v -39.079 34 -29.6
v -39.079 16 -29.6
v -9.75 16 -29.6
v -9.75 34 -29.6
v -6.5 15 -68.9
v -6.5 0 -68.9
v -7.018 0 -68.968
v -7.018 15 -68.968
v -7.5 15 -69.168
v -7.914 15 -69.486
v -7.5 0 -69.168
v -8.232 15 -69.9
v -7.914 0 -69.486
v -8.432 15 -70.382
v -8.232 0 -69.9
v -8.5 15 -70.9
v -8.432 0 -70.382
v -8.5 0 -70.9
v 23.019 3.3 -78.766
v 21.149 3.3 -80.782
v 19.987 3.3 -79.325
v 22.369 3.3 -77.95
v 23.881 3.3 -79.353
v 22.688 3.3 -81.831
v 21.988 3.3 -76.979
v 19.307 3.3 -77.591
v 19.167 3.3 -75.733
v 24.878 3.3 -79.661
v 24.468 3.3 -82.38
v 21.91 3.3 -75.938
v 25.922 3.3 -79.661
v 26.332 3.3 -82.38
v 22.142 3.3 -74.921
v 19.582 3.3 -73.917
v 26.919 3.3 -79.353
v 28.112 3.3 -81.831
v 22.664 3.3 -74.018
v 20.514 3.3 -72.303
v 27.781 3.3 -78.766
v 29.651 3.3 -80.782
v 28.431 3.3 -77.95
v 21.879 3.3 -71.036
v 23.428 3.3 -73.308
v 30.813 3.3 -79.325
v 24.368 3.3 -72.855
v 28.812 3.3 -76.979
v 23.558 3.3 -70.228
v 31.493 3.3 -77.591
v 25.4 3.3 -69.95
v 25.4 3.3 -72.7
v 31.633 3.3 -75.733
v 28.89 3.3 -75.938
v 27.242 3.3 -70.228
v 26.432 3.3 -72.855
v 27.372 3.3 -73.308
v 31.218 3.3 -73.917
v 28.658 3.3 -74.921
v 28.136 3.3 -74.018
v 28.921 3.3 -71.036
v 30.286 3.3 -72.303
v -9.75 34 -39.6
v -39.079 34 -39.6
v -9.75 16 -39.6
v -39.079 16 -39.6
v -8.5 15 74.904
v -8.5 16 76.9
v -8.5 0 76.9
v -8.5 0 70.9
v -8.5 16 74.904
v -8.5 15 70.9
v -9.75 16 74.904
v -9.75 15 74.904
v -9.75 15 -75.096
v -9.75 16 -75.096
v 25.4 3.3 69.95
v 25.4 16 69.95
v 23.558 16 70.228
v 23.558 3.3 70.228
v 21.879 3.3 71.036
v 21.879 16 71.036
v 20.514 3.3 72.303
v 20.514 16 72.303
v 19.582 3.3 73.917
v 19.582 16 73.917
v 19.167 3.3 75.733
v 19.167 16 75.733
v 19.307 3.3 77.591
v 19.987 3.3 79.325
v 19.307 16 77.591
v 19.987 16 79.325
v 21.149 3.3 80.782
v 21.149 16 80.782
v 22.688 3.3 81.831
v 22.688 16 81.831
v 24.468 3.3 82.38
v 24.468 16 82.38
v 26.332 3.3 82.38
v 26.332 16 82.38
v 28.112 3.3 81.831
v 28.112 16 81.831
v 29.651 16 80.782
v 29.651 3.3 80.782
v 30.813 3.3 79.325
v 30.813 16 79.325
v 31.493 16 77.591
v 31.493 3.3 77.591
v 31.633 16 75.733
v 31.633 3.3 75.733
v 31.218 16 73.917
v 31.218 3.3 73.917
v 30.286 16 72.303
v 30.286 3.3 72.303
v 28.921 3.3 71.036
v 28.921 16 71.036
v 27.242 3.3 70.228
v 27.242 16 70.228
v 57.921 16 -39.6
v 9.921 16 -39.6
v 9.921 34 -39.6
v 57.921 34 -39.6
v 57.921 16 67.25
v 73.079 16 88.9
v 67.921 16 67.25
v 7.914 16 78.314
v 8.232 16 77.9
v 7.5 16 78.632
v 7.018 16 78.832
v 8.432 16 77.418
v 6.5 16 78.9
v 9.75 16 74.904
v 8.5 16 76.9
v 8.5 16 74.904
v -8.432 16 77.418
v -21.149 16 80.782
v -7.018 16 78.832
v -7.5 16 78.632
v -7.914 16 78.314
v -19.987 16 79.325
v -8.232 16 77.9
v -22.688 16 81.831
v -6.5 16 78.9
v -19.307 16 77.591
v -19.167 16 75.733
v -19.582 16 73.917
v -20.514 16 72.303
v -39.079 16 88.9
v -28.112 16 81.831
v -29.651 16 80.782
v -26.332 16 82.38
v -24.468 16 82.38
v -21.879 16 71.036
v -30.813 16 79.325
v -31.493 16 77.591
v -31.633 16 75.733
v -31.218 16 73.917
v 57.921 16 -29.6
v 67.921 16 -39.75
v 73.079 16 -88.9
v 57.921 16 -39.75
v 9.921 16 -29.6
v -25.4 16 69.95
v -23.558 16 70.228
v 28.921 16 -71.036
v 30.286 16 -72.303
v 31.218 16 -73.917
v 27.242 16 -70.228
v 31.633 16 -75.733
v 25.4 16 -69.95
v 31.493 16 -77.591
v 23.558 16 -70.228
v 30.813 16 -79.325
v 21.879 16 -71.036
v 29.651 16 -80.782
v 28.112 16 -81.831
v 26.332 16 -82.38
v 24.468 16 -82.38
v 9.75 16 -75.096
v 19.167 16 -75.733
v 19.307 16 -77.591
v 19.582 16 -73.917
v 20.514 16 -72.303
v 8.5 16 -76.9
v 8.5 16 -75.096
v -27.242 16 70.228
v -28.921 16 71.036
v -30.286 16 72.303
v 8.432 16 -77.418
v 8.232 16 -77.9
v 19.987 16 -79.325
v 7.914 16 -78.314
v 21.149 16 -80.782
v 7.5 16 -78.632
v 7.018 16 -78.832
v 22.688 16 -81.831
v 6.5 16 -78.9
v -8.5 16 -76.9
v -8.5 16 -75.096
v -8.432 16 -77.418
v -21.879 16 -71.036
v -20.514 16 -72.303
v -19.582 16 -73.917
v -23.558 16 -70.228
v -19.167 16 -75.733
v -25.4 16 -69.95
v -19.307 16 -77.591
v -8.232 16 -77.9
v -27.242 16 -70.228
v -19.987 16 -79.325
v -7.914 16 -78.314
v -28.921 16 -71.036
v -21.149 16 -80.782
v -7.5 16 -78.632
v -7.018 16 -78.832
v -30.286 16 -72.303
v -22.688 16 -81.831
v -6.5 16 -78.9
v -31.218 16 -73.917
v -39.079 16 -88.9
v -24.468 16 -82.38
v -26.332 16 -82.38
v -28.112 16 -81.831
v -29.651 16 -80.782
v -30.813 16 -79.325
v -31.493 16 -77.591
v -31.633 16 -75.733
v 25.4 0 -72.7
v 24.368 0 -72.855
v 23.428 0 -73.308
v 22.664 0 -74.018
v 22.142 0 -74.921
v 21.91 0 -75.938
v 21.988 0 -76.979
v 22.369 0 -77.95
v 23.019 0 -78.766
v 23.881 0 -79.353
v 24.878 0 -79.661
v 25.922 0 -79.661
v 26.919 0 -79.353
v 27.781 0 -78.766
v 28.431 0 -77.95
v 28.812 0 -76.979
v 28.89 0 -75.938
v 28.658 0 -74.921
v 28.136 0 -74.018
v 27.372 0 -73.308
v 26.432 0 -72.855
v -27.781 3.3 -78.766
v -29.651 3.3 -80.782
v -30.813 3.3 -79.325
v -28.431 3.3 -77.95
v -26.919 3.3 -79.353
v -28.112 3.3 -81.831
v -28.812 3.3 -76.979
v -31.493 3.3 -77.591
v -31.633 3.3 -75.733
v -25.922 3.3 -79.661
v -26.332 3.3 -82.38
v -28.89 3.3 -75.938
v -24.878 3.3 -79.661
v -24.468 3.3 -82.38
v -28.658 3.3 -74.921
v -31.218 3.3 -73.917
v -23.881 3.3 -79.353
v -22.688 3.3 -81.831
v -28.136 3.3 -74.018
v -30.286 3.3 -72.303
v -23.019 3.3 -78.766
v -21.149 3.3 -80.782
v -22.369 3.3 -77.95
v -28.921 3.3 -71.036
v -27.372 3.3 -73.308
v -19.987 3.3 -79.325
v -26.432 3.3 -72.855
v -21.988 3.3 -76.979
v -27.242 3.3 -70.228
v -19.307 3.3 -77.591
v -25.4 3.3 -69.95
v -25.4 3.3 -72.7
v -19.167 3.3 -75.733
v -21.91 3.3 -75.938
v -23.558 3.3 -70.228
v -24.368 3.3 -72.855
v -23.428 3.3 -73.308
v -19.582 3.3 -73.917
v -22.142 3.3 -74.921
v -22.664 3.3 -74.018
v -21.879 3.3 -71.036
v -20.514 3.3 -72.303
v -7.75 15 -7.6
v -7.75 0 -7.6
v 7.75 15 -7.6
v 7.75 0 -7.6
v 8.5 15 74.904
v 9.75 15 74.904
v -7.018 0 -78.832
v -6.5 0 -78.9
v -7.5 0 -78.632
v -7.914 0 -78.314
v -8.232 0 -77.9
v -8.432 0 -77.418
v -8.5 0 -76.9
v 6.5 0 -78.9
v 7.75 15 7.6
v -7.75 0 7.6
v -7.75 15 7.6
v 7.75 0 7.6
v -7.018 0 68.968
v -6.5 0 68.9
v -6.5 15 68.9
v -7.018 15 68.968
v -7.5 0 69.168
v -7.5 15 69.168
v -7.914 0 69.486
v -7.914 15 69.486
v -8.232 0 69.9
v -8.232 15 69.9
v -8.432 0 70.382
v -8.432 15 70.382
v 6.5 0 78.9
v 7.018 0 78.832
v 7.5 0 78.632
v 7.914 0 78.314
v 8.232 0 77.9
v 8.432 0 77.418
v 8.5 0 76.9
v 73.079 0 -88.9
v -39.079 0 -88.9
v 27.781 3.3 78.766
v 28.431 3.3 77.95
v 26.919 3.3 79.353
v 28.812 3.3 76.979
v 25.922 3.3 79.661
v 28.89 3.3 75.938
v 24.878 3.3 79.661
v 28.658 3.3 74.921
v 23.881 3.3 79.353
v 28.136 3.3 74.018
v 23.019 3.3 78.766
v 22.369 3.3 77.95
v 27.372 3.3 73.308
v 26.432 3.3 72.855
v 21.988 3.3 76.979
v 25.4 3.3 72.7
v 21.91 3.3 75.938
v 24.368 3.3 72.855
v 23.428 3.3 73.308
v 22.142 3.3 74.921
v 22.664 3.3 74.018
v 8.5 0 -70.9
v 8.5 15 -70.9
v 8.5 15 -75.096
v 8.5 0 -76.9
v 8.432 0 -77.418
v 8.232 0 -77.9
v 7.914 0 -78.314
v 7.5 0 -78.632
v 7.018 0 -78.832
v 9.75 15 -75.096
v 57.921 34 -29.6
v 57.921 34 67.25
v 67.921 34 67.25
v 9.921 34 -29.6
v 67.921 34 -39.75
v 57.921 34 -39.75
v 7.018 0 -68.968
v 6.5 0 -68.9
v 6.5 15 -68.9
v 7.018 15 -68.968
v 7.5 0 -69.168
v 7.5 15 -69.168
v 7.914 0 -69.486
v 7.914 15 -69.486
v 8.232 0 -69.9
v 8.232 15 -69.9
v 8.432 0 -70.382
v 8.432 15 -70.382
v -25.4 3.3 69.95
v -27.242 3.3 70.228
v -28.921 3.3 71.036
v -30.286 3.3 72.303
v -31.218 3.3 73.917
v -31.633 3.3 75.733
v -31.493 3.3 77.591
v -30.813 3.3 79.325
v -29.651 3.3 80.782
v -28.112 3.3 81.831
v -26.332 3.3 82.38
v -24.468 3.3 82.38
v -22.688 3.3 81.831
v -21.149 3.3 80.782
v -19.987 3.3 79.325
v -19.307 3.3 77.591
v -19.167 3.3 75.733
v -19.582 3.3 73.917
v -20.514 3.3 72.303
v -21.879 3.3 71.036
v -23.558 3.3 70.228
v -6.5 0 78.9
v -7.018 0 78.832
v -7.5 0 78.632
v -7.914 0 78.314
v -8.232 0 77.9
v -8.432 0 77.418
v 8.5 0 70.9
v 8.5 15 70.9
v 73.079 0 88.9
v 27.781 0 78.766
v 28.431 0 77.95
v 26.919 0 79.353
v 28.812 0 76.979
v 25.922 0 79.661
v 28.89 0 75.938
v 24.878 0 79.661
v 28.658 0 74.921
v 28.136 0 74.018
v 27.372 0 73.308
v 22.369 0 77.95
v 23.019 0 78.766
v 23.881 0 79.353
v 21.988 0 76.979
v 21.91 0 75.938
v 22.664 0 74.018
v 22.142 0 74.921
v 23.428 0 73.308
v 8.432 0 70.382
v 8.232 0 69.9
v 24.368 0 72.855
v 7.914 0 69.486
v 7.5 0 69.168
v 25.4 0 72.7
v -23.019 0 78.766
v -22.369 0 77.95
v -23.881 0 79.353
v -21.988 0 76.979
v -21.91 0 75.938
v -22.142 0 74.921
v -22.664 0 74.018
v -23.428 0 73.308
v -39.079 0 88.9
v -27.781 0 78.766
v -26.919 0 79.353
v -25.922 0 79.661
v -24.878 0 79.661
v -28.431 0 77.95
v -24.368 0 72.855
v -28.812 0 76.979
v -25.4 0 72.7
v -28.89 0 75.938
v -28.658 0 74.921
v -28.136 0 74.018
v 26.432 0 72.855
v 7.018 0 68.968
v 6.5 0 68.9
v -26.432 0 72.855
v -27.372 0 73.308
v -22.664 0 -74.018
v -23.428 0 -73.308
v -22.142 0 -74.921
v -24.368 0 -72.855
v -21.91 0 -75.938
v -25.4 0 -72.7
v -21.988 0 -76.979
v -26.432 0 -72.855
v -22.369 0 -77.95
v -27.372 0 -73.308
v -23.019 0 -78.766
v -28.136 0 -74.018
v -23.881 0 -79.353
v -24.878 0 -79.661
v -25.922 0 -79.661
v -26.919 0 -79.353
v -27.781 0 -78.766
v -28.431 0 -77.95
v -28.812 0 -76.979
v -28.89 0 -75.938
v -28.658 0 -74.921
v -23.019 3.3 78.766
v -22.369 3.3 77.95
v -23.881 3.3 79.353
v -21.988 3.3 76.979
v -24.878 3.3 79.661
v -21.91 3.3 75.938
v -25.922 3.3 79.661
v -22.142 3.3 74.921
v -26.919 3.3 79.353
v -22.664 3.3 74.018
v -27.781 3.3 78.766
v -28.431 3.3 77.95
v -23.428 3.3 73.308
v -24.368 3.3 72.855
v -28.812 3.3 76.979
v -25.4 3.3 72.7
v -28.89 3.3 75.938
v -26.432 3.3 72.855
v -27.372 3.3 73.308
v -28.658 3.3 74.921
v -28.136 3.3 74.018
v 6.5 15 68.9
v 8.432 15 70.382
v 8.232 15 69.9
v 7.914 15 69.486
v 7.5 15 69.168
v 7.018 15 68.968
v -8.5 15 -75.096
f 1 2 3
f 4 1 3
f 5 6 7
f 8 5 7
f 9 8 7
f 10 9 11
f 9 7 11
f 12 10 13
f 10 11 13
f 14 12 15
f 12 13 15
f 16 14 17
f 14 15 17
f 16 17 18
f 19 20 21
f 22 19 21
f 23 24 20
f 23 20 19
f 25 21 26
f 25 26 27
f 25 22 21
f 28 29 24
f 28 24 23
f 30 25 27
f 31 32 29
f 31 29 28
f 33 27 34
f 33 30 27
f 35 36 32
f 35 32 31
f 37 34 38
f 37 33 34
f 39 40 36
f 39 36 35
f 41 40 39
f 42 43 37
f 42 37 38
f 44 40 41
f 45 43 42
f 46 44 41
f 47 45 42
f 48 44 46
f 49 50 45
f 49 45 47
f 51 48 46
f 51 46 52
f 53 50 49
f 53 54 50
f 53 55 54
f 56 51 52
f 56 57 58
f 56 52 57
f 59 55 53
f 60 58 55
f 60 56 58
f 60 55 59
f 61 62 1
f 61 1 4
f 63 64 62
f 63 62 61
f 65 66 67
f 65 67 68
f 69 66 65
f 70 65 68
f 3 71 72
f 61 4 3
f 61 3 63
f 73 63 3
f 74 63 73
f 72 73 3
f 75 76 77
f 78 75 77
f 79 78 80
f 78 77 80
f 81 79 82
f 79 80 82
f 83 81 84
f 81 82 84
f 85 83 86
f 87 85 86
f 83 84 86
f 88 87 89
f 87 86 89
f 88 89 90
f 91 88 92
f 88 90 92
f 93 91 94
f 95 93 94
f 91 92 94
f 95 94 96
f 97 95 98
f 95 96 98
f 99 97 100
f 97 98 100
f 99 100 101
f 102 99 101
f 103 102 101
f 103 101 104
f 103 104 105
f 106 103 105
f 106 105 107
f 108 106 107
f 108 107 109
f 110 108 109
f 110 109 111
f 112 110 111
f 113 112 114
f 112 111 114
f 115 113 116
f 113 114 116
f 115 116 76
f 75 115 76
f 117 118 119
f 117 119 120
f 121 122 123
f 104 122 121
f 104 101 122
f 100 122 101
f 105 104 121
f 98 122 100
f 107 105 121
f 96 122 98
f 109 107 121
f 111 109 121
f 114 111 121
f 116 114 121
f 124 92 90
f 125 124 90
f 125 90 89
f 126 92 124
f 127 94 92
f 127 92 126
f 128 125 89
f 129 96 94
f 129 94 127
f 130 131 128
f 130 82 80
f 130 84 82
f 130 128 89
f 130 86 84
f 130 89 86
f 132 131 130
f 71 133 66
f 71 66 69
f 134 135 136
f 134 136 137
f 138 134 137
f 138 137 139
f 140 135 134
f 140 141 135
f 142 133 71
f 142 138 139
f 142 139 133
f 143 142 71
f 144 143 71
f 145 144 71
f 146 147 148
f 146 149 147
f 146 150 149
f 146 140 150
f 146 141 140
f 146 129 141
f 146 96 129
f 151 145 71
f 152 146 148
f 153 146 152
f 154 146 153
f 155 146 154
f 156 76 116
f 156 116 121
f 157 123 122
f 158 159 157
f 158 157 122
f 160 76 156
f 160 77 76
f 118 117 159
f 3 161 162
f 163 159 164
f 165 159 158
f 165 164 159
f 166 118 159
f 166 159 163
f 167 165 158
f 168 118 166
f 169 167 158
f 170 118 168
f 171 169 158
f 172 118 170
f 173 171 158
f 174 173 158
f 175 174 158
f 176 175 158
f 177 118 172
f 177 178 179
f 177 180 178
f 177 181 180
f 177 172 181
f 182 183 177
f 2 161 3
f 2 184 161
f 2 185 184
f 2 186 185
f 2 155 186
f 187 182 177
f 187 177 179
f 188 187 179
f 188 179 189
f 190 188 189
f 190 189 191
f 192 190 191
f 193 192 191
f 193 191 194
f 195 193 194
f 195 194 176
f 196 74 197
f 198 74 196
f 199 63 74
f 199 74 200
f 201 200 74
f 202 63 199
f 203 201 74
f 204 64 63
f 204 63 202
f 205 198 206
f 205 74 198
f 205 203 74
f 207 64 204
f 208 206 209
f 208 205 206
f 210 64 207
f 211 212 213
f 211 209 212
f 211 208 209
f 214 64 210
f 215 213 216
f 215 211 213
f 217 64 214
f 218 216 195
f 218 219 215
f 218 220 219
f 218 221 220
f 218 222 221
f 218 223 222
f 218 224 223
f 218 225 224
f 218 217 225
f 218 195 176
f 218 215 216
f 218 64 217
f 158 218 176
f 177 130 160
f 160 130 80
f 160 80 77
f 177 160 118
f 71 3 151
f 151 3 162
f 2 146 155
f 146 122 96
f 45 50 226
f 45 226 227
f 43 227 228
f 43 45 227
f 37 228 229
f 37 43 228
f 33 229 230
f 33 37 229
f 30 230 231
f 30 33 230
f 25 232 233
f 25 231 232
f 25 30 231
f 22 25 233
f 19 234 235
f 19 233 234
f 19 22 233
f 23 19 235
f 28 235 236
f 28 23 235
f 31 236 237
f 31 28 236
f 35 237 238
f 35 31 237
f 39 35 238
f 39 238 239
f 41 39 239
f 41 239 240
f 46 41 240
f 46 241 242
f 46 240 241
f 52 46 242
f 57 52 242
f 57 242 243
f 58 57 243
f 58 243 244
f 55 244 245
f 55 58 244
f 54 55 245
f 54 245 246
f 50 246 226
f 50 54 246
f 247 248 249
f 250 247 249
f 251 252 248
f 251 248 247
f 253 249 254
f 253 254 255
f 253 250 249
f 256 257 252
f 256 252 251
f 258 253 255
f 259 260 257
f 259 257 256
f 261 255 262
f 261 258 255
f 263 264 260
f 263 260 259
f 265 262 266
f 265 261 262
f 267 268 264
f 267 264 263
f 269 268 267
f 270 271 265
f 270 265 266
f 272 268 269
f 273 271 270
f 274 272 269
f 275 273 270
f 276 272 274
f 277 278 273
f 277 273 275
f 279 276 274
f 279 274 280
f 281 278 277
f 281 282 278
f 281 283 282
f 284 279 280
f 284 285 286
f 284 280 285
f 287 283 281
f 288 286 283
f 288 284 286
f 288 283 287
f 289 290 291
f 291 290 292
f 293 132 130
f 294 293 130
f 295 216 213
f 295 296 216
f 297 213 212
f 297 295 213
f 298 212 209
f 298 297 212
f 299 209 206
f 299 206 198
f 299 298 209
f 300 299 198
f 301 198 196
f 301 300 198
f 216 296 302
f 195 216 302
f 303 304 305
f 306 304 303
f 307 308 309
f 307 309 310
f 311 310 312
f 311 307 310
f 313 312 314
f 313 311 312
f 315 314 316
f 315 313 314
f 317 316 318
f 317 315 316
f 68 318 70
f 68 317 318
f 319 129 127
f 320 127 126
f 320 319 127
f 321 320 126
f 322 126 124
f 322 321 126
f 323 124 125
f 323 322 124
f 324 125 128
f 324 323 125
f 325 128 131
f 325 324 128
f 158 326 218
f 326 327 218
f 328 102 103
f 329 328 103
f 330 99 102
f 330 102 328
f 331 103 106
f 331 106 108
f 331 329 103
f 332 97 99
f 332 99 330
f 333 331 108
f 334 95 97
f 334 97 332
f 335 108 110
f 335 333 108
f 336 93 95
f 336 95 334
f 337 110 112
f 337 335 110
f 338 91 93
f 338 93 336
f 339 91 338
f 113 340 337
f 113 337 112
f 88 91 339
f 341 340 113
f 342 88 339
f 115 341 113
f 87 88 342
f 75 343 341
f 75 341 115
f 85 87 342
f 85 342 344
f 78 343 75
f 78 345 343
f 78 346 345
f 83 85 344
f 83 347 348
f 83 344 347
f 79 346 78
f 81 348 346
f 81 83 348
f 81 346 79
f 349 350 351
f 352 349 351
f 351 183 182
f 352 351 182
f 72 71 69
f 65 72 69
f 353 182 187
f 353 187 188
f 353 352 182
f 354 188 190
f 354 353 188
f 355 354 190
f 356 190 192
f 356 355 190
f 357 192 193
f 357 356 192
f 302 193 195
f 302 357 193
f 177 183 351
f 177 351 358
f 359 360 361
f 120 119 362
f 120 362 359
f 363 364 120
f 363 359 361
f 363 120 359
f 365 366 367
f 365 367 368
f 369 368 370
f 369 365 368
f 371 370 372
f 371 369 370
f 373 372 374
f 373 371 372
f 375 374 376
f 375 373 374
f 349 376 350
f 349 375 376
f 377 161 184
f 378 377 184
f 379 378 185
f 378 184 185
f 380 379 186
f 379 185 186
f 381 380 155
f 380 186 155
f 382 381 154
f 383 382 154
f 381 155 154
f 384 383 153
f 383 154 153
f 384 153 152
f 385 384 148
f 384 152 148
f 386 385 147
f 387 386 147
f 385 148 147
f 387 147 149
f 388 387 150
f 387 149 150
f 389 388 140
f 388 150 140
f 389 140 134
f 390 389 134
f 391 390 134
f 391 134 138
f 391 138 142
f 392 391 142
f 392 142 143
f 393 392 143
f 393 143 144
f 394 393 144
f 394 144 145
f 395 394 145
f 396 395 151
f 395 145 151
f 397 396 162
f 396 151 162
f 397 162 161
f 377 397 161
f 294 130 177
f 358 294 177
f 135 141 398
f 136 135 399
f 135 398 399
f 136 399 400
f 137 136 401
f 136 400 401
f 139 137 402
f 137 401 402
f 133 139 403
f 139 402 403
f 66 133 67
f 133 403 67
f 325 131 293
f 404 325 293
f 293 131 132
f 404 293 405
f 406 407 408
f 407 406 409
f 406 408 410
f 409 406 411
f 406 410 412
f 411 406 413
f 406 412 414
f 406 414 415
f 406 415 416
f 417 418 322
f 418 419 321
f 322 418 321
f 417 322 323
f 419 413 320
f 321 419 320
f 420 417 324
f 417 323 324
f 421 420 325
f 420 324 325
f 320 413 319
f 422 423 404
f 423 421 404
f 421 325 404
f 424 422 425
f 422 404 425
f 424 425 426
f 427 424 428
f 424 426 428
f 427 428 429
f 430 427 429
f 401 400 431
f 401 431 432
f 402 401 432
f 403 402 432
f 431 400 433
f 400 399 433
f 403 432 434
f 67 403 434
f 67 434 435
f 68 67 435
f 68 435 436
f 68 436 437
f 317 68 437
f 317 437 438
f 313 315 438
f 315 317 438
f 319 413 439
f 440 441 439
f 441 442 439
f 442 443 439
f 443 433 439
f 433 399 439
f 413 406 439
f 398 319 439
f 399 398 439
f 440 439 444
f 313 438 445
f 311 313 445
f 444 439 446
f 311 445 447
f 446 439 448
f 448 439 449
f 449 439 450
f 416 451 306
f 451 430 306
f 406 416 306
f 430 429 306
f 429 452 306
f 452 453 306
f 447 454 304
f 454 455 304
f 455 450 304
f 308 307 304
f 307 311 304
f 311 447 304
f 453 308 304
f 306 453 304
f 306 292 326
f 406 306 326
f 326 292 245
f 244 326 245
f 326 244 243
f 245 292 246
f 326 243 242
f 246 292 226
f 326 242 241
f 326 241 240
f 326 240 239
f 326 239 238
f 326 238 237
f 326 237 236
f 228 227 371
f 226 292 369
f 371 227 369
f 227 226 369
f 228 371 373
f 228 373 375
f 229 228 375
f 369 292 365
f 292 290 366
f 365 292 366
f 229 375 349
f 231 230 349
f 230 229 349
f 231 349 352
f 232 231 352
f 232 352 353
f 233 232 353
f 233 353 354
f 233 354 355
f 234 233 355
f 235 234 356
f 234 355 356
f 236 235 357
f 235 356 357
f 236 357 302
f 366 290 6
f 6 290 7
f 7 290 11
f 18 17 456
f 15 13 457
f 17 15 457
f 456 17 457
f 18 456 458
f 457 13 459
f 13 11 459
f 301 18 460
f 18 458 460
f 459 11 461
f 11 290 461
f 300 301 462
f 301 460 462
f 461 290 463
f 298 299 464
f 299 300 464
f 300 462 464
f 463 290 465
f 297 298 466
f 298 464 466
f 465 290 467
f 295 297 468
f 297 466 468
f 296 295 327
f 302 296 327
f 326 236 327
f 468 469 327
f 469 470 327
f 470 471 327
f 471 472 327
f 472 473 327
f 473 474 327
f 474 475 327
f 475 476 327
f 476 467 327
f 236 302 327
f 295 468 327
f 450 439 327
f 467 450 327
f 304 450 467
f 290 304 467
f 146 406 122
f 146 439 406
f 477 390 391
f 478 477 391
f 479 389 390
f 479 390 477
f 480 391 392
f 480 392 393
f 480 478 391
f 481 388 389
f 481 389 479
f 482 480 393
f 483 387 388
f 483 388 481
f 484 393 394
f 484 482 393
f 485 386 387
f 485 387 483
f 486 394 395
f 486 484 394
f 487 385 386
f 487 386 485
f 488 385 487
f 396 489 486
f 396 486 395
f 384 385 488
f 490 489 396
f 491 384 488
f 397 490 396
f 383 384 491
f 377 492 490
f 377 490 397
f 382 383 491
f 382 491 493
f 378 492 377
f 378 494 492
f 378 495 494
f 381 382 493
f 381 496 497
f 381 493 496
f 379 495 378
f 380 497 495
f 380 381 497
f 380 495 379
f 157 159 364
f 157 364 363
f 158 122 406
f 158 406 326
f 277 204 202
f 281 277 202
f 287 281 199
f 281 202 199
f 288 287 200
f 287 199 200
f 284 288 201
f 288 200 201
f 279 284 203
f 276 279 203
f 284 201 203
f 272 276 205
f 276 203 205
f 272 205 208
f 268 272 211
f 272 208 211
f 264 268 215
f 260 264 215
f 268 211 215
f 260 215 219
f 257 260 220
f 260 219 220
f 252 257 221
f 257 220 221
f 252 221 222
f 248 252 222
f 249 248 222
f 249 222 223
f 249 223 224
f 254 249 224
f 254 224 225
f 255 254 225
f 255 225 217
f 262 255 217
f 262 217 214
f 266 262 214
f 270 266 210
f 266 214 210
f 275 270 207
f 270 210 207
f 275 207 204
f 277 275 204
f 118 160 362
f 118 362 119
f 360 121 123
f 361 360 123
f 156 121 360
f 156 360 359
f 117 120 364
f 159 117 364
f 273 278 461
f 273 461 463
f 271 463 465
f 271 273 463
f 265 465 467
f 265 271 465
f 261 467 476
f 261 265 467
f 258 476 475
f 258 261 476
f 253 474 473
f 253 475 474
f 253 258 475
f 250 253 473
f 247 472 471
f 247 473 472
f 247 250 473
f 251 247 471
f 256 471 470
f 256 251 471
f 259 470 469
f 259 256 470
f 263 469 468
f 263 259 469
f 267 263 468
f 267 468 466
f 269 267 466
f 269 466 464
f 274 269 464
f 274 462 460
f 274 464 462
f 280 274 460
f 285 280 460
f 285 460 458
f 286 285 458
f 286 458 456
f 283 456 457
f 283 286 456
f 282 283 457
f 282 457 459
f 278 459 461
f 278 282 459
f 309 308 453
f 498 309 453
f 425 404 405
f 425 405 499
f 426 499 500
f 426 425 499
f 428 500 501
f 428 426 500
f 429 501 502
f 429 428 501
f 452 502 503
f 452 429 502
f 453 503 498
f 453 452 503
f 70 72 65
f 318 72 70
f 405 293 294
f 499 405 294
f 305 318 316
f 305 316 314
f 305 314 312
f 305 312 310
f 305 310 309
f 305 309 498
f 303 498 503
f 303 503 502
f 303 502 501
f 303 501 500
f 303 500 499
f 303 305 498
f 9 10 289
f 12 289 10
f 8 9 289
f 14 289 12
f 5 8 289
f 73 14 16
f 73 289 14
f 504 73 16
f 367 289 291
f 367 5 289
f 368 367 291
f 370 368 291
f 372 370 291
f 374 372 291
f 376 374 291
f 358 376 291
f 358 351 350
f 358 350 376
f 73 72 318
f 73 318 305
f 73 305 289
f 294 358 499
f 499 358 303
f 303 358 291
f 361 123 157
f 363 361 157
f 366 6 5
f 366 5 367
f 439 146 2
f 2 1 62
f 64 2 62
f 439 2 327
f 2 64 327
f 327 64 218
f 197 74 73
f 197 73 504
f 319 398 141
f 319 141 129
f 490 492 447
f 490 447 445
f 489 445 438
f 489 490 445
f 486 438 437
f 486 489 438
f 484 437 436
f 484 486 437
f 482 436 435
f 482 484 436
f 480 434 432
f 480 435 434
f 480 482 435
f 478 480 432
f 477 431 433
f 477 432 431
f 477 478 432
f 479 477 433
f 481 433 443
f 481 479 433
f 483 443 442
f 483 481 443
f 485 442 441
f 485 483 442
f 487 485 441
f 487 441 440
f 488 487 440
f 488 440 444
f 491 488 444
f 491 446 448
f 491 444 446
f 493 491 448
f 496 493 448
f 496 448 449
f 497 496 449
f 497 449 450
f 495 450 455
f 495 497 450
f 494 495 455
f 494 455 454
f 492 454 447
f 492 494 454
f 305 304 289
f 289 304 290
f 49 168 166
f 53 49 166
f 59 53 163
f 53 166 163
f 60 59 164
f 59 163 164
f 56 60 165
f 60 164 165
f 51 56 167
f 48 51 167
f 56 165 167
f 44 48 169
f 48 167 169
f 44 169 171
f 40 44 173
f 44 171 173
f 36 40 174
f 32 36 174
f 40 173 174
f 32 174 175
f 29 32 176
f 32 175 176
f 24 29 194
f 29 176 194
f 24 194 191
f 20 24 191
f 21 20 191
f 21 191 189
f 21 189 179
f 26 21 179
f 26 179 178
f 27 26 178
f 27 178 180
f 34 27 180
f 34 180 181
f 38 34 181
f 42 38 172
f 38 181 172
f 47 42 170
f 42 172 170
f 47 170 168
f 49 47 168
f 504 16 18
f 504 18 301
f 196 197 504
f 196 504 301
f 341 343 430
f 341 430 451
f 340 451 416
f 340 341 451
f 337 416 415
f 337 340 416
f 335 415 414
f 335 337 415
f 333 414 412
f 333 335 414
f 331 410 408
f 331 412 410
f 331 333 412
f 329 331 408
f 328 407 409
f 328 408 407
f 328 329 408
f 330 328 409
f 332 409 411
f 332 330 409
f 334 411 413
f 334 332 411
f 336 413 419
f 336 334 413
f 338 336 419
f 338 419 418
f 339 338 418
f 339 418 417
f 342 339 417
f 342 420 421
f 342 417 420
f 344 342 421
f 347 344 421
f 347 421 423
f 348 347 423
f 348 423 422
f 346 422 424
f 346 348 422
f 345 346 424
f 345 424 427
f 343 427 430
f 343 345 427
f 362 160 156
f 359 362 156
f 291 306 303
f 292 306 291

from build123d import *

# Parameters (mm, degrees)
SKETCH1_W               = 192.857142858
SKETCH1_H               = 177.8
BOSS_EXTRUDE1_DEPTH     = 16
SKETCH3_R               = 6.25
CUT_EXTRUDE1_DEPTH      = 12.7
CUT_EXTRUDE2_DEPTH      = 133.12751185
CUT_EXTRUDE2_DEPTH_BACK = 133.12751185
SKETCH6_R               = 3.5
CUT_EXTRUDE3_DEPTH      = 133.12751185
CUT_EXTRUDE3_DEPTH_BACK = 133.12751185
SKETCH7_W               = 15.5
SKETCH7_H               = 15.2
SKETCH17_W              = 58.35
SKETCH17_H              = 177.8
CUT_EXTRUDE10_DEPTH     = 133.12751185
SKETCH18_W              = 17
SKETCH18_H              = 10
CUT_EXTRUDE11_DEPTH     = 99.419229548
FILLET1_R               = 2
SKETCH19_W              = 48
SKETCH19_H              = 10
BOSS_EXTRUDE2_DEPTH     = 18
SKETCH20_W              = 177.8
SKETCH20_H              = 16
BOSS_EXTRUDE3_DEPTH     = 35
SKETCH21_W              = 10
SKETCH21_H              = 107
BOSS_EXTRUDE4_DEPTH     = 18
SKETCH23_W              = 17
SKETCH23_H              = 10
CUT_EXTRUDE12_DEPTH     = 30
FILLET2_R               = 2
SKETCH22_W              = 19.5
SKETCH22_H              = 150
CUT_EXTRUDE13_DEPTH     = 1
SKETCH24_W              = 29.328571429
SKETCH24_H              = 10
BOSS_EXTRUDE5_DEPTH     = 18


with BuildPart() as part:
    # Sketch1 → Boss-Extrude1 (new body)
    with BuildSketch(Plane(origin=(0, 0, 0), x_dir=(1, 0, 0), z_dir=(0, 1, 0))):
        Rectangle(SKETCH1_W, SKETCH1_H)
    extrude(amount=BOSS_EXTRUDE1_DEPTH)

    # Sketch3 → Cut-Extrude1 (cut)
    with BuildSketch(Plane(origin=(0, 16, 0), x_dir=(1, 0, 0), z_dir=(0, 1, 0))):
        with Locations(Location((-25.4, 76.2, 0), (0, 0, 270))):
            Circle(SKETCH3_R)
        with Locations(Location((25.4, 76.2, 0), (0, 0, 270))):
            Circle(SKETCH3_R)
        with Locations(Location((25.4, -76.2, 0), (0, 0, 90))):
            Circle(SKETCH3_R)
        with Locations(Location((-25.4, -76.2, 0), (0, 0, 90))):
            Circle(SKETCH3_R)
    extrude(amount=-CUT_EXTRUDE1_DEPTH, mode=Mode.SUBTRACT)

    # Sketch6 → Cut-Extrude2 (cut, two sides: drawn at the far end of the back side and taken through both)
    with BuildSketch(Plane(origin=(0, 0, 0), x_dir=(-1, 0, 0), z_dir=(0, -1, 0)).offset(-CUT_EXTRUDE2_DEPTH_BACK)):
        with Locations(Location((25.4, -76.2, 0), (0, 0, 90))):
            Circle(SKETCH6_R)
        with Locations(Location((-25.4, -76.2, 0), (0, 0, 90))):
            Circle(SKETCH6_R)
        with Locations(Location((-25.4, 76.2, 0), (0, 0, 270))):
            Circle(SKETCH6_R)
        with Locations(Location((25.4, 76.2, 0), (0, 0, 270))):
            Circle(SKETCH6_R)
    extrude(amount=CUT_EXTRUDE2_DEPTH + CUT_EXTRUDE2_DEPTH_BACK, mode=Mode.SUBTRACT)

    # Sketch7 → Cut-Extrude3 (cut, two sides: drawn at the far end of the back side and taken through both)
    with BuildSketch(Plane(origin=(0, 16, 0), x_dir=(1, 0, 0), z_dir=(0, 1, 0)).offset(-CUT_EXTRUDE3_DEPTH_BACK)):
        Rectangle(SKETCH7_W, SKETCH7_H)
    extrude(amount=CUT_EXTRUDE3_DEPTH + CUT_EXTRUDE3_DEPTH_BACK, mode=Mode.SUBTRACT)

    # Sketch17 → Cut-Extrude10 (cut, symmetric)
    with BuildSketch(Plane(origin=(0, 16, 0), x_dir=(1, 0, 0), z_dir=(0, 1, 0))):
        with Locations((67.253571429, 0)):
            Rectangle(SKETCH17_W, SKETCH17_H)
    cut_extrude10 = extrude(amount=CUT_EXTRUDE10_DEPTH, both=True, mode=Mode.SUBTRACT)

    # Mirror5: Cut-Extrude10 across plane
    add(cut_extrude10.mirror(Plane(origin=(-0.5, 0, 0), x_dir=(0, 0, 1), z_dir=(1, 0, 0))), mode=Mode.SUBTRACT)

    # Sketch18 → Cut-Extrude11 (cut, through all)
    with BuildSketch(Plane(origin=(0, 16, 0), x_dir=(1, 0, 0), z_dir=(0, 1, 0))):
        with Locations((0, -73.9)):
            Rectangle(SKETCH18_W, SKETCH18_H)
    extrude(amount=-CUT_EXTRUDE11_DEPTH, mode=Mode.SUBTRACT)

    # Fillet1
    fillet1_edges = [part.edges().sort_by_distance(p)[0] for p in [
        (-8.5, 8, 78.9),
        (-8.5, 8, 68.9),
        (8.5, 8, 68.9),
        (8.5, 8, 78.9),
    ]]
    fillet(fillet1_edges, radius=FILLET1_R)

    # Sketch19 → Boss-Extrude2 (add)
    with BuildSketch(Plane(origin=(0, 16, 0), x_dir=(1, 0, 0), z_dir=(0, 1, 0))):
        with Locations((33.921428571, 34.6)):
            Rectangle(SKETCH19_W, SKETCH19_H)
    extrude(amount=BOSS_EXTRUDE2_DEPTH)

    # Sketch20 → Boss-Extrude3 (add)
    with BuildSketch(Plane(origin=(38.078571429, 0, 0), x_dir=(0, 0, -1), z_dir=(1, 0, 0))):
        with Locations((0, 8)):
            Rectangle(SKETCH20_W, SKETCH20_H)
    extrude(amount=BOSS_EXTRUDE3_DEPTH)

    # Sketch21 → Boss-Extrude4 (add)
    with BuildSketch(Plane(origin=(0, 16, 0), x_dir=(1, 0, 0), z_dir=(0, 1, 0))):
        with Locations((62.921428571, -13.75)):
            Rectangle(SKETCH21_W, SKETCH21_H)
    extrude(amount=BOSS_EXTRUDE4_DEPTH)

    # Sketch23 → Cut-Extrude12 (cut)
    with BuildSketch(Plane(origin=(0, 16, 0), x_dir=(1, 0, 0), z_dir=(0, 1, 0))):
        with Locations((0, 73.9)):
            Rectangle(SKETCH23_W, SKETCH23_H)
    extrude(amount=-CUT_EXTRUDE12_DEPTH, mode=Mode.SUBTRACT)

    # Fillet2
    fillet2_edges = [part.edges().sort_by_distance(p)[0] for p in [
        (-8.5, 8, -68.9),
        (-8.5, 8, -78.9),
        (8.5, 8, -78.9),
        (8.5, 8, -68.9),
    ]]
    fillet(fillet2_edges, radius=FILLET2_R)

    # Sketch22 → Cut-Extrude13 (cut)
    with BuildSketch(Plane(origin=(0, 16, 0), x_dir=(1, 0, 0), z_dir=(0, 1, 0))):
        with Locations((0, 0.096227078)):
            Rectangle(SKETCH22_W, SKETCH22_H)
    extrude(amount=-CUT_EXTRUDE13_DEPTH, mode=Mode.SUBTRACT)

    # Sketch24 → Boss-Extrude5 (add)
    with BuildSketch(Plane(origin=(0, 16, 0), x_dir=(1, 0, 0), z_dir=(0, 1, 0))):
        with Locations((-24.414285715, 34.6)):
            Rectangle(SKETCH24_W, SKETCH24_H)
    extrude(amount=BOSS_EXTRUDE5_DEPTH)


solid = part.part
